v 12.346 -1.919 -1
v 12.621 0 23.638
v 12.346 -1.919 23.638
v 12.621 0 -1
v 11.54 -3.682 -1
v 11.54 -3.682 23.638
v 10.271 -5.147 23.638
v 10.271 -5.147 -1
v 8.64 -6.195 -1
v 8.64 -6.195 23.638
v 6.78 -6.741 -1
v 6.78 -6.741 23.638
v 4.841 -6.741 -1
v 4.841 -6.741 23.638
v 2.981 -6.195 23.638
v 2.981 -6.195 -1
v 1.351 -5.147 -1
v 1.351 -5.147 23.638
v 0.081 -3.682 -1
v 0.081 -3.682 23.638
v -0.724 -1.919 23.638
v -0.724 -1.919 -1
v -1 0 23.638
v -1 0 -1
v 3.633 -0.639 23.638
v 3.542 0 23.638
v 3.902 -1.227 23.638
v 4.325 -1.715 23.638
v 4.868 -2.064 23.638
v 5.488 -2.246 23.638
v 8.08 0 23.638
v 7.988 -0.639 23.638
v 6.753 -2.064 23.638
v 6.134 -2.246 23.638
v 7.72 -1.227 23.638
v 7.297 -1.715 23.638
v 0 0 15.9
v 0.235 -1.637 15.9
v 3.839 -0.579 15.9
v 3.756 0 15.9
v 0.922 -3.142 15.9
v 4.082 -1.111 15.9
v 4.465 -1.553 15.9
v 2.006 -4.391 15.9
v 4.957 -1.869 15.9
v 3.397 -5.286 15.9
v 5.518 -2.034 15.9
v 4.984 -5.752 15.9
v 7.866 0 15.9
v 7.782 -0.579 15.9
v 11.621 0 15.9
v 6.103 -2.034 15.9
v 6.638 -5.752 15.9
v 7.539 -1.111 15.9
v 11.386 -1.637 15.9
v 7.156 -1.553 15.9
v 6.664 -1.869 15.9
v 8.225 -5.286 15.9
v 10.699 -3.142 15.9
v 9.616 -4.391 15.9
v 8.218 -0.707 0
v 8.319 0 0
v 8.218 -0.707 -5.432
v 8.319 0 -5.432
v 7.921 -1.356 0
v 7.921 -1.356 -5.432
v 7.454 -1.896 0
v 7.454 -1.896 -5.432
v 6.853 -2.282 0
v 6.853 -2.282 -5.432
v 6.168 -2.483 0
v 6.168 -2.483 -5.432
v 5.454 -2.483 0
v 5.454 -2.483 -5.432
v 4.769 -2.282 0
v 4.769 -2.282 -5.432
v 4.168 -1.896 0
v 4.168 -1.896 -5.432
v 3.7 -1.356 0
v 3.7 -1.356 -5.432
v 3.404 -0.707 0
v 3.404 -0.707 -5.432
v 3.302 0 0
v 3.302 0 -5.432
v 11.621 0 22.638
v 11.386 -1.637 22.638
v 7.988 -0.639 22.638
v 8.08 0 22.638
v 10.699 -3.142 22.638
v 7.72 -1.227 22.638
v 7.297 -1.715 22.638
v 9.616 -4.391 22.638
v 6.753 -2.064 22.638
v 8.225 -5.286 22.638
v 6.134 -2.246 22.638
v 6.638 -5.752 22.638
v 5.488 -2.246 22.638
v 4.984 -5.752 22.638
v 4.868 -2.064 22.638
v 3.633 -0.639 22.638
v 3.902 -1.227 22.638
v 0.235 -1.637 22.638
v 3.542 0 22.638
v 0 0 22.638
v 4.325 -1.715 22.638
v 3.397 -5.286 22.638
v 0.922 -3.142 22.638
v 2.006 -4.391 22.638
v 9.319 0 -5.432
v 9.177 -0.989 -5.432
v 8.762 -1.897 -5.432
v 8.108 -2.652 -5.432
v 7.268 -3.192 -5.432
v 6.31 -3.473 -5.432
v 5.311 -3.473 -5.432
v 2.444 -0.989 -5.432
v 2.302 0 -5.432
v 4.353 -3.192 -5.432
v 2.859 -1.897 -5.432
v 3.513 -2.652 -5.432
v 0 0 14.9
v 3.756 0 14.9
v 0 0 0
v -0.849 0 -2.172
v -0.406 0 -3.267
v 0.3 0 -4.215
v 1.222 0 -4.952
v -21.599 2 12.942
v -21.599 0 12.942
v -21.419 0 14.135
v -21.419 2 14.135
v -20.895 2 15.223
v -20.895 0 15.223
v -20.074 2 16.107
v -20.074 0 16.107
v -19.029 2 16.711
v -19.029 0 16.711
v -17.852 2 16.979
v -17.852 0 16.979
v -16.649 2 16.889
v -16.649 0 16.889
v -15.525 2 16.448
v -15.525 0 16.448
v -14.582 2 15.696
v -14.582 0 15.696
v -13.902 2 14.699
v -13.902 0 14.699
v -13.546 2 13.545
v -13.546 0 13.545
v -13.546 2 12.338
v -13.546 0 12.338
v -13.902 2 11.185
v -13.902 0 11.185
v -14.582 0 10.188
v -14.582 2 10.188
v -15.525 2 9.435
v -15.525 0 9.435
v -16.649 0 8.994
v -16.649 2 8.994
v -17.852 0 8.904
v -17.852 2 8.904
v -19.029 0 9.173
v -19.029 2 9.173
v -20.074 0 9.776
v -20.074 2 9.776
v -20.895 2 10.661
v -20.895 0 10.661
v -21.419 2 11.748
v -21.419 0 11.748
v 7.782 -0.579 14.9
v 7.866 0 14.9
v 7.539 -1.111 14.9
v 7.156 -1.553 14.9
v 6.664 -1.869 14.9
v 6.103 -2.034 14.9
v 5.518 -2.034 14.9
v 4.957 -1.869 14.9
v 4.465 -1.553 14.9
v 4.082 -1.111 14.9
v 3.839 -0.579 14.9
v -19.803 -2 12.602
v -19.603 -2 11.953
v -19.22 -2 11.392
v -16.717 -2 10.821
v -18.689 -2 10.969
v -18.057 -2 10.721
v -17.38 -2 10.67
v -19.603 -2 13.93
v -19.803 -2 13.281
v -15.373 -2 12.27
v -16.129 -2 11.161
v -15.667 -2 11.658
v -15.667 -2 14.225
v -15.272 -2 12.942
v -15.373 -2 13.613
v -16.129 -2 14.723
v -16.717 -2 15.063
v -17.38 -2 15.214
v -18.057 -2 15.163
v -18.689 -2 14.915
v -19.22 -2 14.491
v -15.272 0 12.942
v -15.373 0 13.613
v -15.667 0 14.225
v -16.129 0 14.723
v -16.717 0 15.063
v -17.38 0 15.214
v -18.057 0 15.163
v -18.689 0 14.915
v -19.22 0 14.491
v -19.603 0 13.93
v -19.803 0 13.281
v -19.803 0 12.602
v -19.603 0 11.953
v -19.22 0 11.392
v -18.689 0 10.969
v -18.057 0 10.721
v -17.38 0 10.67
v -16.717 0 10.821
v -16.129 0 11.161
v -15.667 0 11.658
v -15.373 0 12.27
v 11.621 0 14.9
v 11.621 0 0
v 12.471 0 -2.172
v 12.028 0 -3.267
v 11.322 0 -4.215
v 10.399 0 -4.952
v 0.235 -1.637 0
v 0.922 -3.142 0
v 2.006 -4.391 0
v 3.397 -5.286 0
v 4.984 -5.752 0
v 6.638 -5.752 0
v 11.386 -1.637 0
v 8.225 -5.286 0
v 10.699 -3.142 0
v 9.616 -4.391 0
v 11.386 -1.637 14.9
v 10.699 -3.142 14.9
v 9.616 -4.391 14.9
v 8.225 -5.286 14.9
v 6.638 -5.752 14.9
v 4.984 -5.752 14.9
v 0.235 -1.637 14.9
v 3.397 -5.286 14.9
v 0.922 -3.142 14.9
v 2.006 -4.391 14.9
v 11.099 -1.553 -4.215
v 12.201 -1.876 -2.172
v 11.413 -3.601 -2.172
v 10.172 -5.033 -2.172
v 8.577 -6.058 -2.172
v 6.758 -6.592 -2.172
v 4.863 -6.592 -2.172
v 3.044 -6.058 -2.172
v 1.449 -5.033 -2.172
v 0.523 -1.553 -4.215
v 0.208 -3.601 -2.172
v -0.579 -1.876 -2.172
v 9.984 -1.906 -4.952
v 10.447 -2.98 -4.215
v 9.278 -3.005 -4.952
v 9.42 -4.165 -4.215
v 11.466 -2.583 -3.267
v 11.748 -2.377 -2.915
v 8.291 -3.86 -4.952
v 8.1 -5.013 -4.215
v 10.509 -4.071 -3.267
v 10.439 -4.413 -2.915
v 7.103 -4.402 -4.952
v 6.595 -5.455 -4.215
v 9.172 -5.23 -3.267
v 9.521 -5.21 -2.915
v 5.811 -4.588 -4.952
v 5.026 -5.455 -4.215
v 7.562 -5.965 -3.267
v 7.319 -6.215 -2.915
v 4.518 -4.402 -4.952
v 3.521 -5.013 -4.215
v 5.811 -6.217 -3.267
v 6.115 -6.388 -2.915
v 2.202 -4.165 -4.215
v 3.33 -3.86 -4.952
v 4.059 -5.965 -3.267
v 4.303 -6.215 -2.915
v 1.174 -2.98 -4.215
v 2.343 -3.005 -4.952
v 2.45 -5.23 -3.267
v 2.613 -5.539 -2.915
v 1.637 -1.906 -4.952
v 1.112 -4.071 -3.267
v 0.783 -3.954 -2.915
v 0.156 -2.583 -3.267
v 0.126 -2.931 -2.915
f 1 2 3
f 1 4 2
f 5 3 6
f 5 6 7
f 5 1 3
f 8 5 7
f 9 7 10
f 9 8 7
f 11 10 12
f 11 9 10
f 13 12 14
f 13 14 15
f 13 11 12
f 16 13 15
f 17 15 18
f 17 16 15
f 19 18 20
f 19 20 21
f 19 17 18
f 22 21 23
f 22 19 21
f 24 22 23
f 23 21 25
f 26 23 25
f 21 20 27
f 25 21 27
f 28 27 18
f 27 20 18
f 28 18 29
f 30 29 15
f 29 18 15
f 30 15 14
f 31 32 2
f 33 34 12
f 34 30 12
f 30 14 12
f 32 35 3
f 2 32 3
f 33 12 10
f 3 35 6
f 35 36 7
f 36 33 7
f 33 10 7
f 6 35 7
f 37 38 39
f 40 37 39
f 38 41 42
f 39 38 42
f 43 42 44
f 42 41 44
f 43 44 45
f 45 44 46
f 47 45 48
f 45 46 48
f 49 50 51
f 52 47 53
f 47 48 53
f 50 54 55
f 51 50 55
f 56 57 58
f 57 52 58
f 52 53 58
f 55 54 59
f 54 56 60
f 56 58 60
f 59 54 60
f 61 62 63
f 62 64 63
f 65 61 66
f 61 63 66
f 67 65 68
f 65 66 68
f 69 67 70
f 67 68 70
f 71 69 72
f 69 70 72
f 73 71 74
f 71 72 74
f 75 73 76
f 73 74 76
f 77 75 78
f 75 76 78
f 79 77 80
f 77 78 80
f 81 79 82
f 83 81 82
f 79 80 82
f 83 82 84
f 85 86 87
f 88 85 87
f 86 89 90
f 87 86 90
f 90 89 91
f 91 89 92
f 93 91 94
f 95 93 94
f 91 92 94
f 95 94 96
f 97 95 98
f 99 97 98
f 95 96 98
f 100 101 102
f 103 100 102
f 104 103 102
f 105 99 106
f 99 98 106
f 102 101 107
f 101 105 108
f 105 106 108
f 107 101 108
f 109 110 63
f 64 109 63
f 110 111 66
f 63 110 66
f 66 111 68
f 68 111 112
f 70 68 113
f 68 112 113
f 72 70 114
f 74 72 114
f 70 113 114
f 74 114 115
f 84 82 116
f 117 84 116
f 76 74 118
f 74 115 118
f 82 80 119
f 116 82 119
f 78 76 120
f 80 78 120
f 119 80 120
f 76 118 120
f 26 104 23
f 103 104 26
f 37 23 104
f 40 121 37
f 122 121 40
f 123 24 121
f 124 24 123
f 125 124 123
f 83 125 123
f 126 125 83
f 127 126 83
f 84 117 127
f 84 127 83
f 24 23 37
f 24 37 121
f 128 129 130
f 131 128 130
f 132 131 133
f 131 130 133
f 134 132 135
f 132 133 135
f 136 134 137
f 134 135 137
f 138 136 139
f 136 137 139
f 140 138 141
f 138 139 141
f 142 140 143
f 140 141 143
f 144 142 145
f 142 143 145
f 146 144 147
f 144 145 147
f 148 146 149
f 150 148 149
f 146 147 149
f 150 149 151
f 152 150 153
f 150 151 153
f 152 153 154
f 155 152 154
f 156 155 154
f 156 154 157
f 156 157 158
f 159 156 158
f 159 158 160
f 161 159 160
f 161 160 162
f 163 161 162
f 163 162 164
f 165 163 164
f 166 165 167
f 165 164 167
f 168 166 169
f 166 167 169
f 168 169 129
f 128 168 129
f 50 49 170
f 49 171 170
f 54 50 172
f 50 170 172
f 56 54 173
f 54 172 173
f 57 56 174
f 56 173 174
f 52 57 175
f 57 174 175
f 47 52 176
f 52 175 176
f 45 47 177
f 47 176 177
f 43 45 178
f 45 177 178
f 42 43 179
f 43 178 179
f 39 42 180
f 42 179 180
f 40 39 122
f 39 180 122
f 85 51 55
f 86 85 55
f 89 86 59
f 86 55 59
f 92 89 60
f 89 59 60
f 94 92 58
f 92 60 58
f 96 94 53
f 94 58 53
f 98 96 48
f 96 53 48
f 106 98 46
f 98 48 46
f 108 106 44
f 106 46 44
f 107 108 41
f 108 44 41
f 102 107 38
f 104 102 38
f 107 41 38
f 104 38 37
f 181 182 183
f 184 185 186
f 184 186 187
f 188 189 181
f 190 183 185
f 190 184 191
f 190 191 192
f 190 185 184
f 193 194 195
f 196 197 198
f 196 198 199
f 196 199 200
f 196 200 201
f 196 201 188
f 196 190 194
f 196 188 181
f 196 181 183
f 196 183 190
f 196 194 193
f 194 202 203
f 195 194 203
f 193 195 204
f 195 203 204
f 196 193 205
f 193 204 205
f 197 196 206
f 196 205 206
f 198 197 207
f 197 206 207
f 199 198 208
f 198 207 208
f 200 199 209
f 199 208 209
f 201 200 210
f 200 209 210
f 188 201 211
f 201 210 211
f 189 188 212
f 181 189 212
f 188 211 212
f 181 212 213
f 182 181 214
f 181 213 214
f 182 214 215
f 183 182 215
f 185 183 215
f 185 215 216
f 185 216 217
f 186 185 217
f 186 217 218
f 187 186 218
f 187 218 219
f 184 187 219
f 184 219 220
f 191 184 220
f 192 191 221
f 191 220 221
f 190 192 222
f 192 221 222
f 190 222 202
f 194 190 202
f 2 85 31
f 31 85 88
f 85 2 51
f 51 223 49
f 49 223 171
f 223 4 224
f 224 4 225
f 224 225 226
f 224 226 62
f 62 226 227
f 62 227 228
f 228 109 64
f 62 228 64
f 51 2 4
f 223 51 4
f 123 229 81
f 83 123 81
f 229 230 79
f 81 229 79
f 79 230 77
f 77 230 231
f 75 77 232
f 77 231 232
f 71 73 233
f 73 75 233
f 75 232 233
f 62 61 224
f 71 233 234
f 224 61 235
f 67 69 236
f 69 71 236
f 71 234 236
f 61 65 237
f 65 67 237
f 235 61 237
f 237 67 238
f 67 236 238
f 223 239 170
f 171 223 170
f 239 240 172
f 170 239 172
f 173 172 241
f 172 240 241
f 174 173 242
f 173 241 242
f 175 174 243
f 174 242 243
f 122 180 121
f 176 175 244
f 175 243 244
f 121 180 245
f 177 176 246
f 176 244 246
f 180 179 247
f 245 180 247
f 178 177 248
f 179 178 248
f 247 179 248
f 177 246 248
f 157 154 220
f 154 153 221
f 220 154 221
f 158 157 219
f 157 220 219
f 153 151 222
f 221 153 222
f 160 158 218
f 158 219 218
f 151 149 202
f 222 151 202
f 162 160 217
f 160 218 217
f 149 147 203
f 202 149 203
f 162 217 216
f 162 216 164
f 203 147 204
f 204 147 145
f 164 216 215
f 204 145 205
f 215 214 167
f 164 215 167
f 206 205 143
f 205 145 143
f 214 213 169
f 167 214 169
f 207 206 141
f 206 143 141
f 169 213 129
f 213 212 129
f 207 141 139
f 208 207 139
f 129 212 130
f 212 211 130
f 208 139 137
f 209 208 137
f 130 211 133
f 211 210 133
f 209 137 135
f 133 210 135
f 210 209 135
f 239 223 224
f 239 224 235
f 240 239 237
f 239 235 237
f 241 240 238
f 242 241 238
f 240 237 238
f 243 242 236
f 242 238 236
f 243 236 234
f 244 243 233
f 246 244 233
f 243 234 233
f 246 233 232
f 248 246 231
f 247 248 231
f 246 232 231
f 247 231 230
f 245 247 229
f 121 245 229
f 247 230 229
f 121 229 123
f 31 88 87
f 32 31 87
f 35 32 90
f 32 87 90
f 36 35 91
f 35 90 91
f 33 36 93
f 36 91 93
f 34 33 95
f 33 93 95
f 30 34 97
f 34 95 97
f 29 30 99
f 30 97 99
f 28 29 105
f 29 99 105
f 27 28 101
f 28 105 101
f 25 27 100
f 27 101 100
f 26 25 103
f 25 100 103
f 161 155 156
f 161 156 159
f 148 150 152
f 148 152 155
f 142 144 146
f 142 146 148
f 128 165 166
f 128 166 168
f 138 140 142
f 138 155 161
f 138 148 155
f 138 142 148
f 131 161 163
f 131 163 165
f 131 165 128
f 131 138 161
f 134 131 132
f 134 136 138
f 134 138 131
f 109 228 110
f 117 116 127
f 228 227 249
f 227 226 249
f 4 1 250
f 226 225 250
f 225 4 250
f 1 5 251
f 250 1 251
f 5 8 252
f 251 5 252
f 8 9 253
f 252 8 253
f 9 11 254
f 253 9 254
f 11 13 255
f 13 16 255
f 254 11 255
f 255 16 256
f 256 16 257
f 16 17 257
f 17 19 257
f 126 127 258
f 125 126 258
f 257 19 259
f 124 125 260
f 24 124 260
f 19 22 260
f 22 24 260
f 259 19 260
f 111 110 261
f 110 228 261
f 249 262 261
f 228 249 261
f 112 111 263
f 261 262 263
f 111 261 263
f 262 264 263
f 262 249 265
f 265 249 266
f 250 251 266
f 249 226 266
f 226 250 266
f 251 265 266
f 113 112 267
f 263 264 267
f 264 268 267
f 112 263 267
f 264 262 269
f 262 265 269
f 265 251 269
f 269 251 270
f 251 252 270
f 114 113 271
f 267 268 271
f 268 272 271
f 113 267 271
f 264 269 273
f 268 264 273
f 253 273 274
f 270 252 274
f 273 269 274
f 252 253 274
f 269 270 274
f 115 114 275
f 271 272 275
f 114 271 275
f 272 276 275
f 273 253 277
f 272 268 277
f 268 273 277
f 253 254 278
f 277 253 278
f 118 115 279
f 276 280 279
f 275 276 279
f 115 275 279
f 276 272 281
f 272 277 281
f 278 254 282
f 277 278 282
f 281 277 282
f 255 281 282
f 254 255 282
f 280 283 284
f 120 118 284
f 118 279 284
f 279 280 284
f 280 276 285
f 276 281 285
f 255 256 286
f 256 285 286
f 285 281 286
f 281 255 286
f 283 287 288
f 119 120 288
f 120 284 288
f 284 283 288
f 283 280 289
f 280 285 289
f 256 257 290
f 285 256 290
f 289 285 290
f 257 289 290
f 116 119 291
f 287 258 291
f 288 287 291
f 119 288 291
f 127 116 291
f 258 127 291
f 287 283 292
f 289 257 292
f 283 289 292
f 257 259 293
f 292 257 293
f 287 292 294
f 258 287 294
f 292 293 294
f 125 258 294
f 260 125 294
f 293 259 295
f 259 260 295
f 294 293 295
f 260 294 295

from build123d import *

# Parameters (mm, degrees)
F1_ANGLE = 180
F2_DEPTH = 3
F3_DEPTH = 3
F4_R     = 2.2783423097
F5_DEPTH = 2
F6_R     = 4.0488985141
F6_R_2   = 2.2783423097
F7_DEPTH = 2


with BuildPart() as f1:
    # F0 (on Front) → F1 (revolve)
    with BuildSketch(Plane.XZ):
        with BuildLine():
            Line((11.6213960573, 14.9004508704), (11.6213960573, 0))
            Line((11.6213960573, 0), (8.3194198087, 0))
            Line((8.3194198087, 0), (8.3194198087, -1))
            Line((8.3194198087, -1), (8.3194198087, -5.4323007353))
            Line((8.3194198087, -5.4323007353), (9.3194198087, -5.4323007353))
            ThreePointArc((9.3194198087, -5.4323007353), (11.7051618742, -3.7635274992), (12.6213960573, -1))
            Line((12.6213960573, -1), (12.6213960573, 15.9004508704))
            Line((12.6213960573, 15.9004508704), (12.6213960573, 19.6379758418))
            Line((12.6213960573, 19.6379758418), (12.6213960573, 20.6379758418))
            Line((12.6213960573, 20.6379758418), (8.0798119307, 20.6379758418))
            Line((8.0798119307, 20.6379758418), (8.0798119307, 19.6379758418))
            Line((8.0798119307, 19.6379758418), (11.6213960573, 19.6379758418))
            Line((11.6213960573, 19.6379758418), (11.6213960573, 15.9004508704))
            Line((11.6213960573, 15.9004508704), (9.7232601838, 15.9004508704))
            Line((9.7232601838, 15.9004508704), (7.8655318357, 15.9004508704))
            Line((7.8655318357, 15.9004508704), (7.8655318357, 14.9004508704))
            Line((7.8655318357, 14.9004508704), (9.7232601838, 14.9004508704))
            Line((9.7232601838, 14.9004508704), (11.6213960573, 14.9004508704))
        make_face()
    revolve(axis=Axis((5.8106980287, 0, 17.7692133561), (0, 0, -1)), revolution_arc=F1_ANGLE)

    # F2 (add): a face of the model
    f2_faces = [f1.faces().sort_by_distance(p)[0] for p in [
        (5.8106980287, -3.1312214854, 20.6379758418),
    ]]
    extrude(f2_faces, amount=F2_DEPTH)

    # F3 (cut): a face of the model
    f3_faces = [f1.faces().sort_by_distance(p)[0] for p in [
        (5.8106980287, -2.7365950697, 19.6379758418),
    ]]
    extrude(f3_faces, amount=-F3_DEPTH, mode=Mode.SUBTRACT)


with BuildPart() as f5:
    # F4 (on Front) → F5 (new body)
    with BuildSketch(Plane.XZ):
        with Locations((-17.5498593599, 12.9418279976)):
            Circle(F4_R)
    extrude(amount=F5_DEPTH)

    # F6 (on face) → F7 (join)
    with BuildSketch(Plane(origin=(0, 0, 0), x_dir=(-1, 0, 0), z_dir=(0, 1, 0))):
        with Locations((17.5498593599, 12.9418279976)):
            Circle(F6_R)
        with Locations((17.5498593599, 12.9418279976)):
            Circle(F6_R_2, mode=Mode.SUBTRACT)
        with Locations((17.5498593599, 12.9418279976)):
            Circle(F6_R_2)
    extrude(amount=F7_DEPTH)


solid = Compound([f1.part, f5.part])
